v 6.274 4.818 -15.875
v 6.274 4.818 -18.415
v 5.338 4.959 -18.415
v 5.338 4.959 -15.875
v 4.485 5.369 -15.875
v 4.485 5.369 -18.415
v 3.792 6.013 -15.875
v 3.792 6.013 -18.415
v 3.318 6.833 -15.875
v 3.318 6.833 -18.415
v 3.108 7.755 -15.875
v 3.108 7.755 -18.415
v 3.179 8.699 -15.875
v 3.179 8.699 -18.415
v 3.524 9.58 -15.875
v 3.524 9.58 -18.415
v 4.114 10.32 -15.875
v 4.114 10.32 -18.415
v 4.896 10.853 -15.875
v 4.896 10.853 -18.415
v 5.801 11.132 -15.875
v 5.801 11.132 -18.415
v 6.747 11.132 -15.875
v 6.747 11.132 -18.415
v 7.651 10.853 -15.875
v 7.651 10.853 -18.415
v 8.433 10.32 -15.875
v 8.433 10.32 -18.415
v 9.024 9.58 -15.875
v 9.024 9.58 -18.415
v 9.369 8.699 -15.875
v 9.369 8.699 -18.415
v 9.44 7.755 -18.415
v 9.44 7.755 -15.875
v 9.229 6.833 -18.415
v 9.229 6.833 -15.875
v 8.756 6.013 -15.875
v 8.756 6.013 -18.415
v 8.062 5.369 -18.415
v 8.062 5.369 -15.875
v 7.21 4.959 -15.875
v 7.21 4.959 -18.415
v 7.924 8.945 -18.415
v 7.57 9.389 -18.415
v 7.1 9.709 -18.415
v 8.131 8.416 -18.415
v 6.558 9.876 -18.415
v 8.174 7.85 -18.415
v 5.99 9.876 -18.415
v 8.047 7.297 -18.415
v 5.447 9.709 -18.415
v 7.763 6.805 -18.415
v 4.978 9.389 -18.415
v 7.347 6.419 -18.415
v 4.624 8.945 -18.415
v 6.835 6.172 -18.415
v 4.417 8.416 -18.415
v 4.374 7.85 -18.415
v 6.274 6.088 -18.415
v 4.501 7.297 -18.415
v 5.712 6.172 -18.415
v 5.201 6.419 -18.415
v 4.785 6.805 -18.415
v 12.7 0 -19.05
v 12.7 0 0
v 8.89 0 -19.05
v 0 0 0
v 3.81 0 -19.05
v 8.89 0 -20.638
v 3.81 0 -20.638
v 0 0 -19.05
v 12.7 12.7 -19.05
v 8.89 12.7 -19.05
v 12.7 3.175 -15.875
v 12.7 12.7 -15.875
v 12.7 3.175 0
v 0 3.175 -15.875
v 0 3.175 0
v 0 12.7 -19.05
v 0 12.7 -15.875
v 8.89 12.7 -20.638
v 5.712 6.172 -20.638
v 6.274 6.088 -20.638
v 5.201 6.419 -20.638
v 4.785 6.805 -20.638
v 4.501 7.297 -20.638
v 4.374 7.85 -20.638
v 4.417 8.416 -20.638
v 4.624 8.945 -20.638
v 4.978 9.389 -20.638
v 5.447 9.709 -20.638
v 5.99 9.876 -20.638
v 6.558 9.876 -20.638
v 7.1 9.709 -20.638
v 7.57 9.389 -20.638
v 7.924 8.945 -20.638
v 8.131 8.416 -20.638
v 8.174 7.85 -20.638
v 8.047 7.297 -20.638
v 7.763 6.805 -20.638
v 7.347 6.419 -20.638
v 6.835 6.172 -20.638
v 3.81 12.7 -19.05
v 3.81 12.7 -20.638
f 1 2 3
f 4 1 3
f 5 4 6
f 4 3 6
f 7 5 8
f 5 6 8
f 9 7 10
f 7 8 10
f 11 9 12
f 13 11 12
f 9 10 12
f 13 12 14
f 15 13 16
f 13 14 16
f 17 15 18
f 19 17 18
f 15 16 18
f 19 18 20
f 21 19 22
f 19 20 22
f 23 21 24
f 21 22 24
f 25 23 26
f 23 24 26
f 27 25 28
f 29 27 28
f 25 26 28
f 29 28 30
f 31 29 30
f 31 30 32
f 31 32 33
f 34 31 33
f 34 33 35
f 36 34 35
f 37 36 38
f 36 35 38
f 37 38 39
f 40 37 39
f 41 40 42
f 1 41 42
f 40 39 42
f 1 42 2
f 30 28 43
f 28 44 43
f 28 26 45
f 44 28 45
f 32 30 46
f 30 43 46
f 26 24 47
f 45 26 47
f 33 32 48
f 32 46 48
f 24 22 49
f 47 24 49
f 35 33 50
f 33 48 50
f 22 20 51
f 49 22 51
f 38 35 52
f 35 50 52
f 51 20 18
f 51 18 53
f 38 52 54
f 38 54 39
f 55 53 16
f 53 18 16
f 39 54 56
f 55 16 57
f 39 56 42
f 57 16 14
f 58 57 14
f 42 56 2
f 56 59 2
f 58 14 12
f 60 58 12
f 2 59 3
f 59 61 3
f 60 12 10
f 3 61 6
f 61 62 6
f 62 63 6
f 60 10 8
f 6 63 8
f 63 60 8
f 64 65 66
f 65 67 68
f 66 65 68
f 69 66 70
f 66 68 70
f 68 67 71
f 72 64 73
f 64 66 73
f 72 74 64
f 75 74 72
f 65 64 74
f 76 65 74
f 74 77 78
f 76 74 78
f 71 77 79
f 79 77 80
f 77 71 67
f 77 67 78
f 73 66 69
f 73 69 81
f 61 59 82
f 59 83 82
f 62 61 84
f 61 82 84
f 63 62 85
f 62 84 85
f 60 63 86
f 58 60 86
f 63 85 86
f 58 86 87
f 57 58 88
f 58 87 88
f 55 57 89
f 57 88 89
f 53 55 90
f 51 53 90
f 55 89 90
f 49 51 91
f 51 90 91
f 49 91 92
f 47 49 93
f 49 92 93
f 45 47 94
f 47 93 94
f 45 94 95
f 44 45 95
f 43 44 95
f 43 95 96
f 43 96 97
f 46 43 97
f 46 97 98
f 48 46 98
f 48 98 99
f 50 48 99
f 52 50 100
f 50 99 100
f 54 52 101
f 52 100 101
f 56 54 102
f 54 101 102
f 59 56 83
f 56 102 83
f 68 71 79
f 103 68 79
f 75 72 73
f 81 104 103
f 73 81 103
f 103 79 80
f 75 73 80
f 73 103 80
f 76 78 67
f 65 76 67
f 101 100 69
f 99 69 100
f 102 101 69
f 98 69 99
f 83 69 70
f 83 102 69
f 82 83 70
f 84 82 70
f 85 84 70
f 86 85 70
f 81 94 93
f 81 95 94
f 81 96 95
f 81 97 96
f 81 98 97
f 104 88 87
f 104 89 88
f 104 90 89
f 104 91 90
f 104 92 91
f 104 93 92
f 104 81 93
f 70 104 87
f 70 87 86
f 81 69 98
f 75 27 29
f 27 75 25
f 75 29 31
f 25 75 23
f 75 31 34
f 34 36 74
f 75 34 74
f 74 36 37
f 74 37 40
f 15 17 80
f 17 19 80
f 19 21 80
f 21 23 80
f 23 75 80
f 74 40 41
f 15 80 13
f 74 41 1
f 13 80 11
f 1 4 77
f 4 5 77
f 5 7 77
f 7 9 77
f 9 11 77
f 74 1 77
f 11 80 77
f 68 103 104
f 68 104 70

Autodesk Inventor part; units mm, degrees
ref_plane "YZ Plane" through (0, 0, 0) normal (1, 0, 0) x (0, 1, 0)
ref_plane "XZ Plane" through (0, 0, 0) normal (0, 1, 0) x (-1, 0, 0)
ref_plane "XY Plane" through (0, 0, 0) normal (0, 0, 1) x (1, 0, 0)
sketch "Sketch1" plane through (0, 0, 0) normal (1, 0, 0) x (0, 1, 0)
  line L0 (0, 0) -> (0, -19.05)
  line L1 (0, -19.05) -> (12.7, -19.05)
  line L2 (12.7, -19.05) -> (12.7, -15.875)
  line L3 (12.7, -15.875) -> (3.175, -15.875)
  line L4 (3.175, -15.875) -> (3.175, 0)
  line L5 (3.175, 0) -> (0, 0)
  dimension "d0" = 3.175
  dimension "d1" = 12.7
  dimension "d4" = 3.175
  dimension "d5" = 19.05
extrude "Extrusion1" add sketch "Sketch1" along normal blind 12.7
sketch "Sketch4" plane through (0, 0, -19.05) normal (0, 0, -1) x (-1, 0, 0)
  line L0 (0, 12.7) -> (-12.7, 12.7) projected
  line L1 (0, 0) -> (-12.7, 0) projected
  line L2 (-8.89, 12.7) -> (-3.81, 12.7)
  line L3 (-3.81, 12.7) -> (-3.81, 0)
  line L4 (-3.81, 0) -> (-8.89, 0)
  line L5 (-8.89, 0) -> (-8.89, 12.7)
  line L6 (0, 0) -> (0, 12.7) projected
  line L7 (0, 12.7) -> (-12.7, 12.7) projected
  line L8 (-12.7, 0) -> (-12.7, 12.7) projected
  line L9 (0, 0) -> (-12.7, 0) projected
  dimension "d22" = 5.08
  dimension "d23" = 12.7
  dimension "d24" = 3.81
extrude "Extrusion2" add sketch "Sketch4" along normal blind 1.5875 contours L3 L1 L5 L0
sketch "Sketch5" plane through (0, 3.175, -15.875) normal (0, 0, 1) x (1, 0, 0)
  line L0 (0, 9.525) -> (0, 0) projected
  line L1 (0, 0) -> (12.7, 0) projected
  line L2 (12.7, 9.525) -> (12.7, 0) projected
  line L3 (0, 9.525) -> (12.7, 9.525) projected
  point P0 (0, -3.175)
  point P1 (6.2739, 4.8175)
hole "Hole3" at (6.2739, 7.9925, -15.875) direction (0, 0, -1) diameter 3.81 end through all counterbore diameter 6.35 counterbore depth 2.54
equation "\"d4\" = d0"
equation "\"d24\" = -0.5 * d22 + 0.5 * d23"
properties part number "spring tab for on arm"
